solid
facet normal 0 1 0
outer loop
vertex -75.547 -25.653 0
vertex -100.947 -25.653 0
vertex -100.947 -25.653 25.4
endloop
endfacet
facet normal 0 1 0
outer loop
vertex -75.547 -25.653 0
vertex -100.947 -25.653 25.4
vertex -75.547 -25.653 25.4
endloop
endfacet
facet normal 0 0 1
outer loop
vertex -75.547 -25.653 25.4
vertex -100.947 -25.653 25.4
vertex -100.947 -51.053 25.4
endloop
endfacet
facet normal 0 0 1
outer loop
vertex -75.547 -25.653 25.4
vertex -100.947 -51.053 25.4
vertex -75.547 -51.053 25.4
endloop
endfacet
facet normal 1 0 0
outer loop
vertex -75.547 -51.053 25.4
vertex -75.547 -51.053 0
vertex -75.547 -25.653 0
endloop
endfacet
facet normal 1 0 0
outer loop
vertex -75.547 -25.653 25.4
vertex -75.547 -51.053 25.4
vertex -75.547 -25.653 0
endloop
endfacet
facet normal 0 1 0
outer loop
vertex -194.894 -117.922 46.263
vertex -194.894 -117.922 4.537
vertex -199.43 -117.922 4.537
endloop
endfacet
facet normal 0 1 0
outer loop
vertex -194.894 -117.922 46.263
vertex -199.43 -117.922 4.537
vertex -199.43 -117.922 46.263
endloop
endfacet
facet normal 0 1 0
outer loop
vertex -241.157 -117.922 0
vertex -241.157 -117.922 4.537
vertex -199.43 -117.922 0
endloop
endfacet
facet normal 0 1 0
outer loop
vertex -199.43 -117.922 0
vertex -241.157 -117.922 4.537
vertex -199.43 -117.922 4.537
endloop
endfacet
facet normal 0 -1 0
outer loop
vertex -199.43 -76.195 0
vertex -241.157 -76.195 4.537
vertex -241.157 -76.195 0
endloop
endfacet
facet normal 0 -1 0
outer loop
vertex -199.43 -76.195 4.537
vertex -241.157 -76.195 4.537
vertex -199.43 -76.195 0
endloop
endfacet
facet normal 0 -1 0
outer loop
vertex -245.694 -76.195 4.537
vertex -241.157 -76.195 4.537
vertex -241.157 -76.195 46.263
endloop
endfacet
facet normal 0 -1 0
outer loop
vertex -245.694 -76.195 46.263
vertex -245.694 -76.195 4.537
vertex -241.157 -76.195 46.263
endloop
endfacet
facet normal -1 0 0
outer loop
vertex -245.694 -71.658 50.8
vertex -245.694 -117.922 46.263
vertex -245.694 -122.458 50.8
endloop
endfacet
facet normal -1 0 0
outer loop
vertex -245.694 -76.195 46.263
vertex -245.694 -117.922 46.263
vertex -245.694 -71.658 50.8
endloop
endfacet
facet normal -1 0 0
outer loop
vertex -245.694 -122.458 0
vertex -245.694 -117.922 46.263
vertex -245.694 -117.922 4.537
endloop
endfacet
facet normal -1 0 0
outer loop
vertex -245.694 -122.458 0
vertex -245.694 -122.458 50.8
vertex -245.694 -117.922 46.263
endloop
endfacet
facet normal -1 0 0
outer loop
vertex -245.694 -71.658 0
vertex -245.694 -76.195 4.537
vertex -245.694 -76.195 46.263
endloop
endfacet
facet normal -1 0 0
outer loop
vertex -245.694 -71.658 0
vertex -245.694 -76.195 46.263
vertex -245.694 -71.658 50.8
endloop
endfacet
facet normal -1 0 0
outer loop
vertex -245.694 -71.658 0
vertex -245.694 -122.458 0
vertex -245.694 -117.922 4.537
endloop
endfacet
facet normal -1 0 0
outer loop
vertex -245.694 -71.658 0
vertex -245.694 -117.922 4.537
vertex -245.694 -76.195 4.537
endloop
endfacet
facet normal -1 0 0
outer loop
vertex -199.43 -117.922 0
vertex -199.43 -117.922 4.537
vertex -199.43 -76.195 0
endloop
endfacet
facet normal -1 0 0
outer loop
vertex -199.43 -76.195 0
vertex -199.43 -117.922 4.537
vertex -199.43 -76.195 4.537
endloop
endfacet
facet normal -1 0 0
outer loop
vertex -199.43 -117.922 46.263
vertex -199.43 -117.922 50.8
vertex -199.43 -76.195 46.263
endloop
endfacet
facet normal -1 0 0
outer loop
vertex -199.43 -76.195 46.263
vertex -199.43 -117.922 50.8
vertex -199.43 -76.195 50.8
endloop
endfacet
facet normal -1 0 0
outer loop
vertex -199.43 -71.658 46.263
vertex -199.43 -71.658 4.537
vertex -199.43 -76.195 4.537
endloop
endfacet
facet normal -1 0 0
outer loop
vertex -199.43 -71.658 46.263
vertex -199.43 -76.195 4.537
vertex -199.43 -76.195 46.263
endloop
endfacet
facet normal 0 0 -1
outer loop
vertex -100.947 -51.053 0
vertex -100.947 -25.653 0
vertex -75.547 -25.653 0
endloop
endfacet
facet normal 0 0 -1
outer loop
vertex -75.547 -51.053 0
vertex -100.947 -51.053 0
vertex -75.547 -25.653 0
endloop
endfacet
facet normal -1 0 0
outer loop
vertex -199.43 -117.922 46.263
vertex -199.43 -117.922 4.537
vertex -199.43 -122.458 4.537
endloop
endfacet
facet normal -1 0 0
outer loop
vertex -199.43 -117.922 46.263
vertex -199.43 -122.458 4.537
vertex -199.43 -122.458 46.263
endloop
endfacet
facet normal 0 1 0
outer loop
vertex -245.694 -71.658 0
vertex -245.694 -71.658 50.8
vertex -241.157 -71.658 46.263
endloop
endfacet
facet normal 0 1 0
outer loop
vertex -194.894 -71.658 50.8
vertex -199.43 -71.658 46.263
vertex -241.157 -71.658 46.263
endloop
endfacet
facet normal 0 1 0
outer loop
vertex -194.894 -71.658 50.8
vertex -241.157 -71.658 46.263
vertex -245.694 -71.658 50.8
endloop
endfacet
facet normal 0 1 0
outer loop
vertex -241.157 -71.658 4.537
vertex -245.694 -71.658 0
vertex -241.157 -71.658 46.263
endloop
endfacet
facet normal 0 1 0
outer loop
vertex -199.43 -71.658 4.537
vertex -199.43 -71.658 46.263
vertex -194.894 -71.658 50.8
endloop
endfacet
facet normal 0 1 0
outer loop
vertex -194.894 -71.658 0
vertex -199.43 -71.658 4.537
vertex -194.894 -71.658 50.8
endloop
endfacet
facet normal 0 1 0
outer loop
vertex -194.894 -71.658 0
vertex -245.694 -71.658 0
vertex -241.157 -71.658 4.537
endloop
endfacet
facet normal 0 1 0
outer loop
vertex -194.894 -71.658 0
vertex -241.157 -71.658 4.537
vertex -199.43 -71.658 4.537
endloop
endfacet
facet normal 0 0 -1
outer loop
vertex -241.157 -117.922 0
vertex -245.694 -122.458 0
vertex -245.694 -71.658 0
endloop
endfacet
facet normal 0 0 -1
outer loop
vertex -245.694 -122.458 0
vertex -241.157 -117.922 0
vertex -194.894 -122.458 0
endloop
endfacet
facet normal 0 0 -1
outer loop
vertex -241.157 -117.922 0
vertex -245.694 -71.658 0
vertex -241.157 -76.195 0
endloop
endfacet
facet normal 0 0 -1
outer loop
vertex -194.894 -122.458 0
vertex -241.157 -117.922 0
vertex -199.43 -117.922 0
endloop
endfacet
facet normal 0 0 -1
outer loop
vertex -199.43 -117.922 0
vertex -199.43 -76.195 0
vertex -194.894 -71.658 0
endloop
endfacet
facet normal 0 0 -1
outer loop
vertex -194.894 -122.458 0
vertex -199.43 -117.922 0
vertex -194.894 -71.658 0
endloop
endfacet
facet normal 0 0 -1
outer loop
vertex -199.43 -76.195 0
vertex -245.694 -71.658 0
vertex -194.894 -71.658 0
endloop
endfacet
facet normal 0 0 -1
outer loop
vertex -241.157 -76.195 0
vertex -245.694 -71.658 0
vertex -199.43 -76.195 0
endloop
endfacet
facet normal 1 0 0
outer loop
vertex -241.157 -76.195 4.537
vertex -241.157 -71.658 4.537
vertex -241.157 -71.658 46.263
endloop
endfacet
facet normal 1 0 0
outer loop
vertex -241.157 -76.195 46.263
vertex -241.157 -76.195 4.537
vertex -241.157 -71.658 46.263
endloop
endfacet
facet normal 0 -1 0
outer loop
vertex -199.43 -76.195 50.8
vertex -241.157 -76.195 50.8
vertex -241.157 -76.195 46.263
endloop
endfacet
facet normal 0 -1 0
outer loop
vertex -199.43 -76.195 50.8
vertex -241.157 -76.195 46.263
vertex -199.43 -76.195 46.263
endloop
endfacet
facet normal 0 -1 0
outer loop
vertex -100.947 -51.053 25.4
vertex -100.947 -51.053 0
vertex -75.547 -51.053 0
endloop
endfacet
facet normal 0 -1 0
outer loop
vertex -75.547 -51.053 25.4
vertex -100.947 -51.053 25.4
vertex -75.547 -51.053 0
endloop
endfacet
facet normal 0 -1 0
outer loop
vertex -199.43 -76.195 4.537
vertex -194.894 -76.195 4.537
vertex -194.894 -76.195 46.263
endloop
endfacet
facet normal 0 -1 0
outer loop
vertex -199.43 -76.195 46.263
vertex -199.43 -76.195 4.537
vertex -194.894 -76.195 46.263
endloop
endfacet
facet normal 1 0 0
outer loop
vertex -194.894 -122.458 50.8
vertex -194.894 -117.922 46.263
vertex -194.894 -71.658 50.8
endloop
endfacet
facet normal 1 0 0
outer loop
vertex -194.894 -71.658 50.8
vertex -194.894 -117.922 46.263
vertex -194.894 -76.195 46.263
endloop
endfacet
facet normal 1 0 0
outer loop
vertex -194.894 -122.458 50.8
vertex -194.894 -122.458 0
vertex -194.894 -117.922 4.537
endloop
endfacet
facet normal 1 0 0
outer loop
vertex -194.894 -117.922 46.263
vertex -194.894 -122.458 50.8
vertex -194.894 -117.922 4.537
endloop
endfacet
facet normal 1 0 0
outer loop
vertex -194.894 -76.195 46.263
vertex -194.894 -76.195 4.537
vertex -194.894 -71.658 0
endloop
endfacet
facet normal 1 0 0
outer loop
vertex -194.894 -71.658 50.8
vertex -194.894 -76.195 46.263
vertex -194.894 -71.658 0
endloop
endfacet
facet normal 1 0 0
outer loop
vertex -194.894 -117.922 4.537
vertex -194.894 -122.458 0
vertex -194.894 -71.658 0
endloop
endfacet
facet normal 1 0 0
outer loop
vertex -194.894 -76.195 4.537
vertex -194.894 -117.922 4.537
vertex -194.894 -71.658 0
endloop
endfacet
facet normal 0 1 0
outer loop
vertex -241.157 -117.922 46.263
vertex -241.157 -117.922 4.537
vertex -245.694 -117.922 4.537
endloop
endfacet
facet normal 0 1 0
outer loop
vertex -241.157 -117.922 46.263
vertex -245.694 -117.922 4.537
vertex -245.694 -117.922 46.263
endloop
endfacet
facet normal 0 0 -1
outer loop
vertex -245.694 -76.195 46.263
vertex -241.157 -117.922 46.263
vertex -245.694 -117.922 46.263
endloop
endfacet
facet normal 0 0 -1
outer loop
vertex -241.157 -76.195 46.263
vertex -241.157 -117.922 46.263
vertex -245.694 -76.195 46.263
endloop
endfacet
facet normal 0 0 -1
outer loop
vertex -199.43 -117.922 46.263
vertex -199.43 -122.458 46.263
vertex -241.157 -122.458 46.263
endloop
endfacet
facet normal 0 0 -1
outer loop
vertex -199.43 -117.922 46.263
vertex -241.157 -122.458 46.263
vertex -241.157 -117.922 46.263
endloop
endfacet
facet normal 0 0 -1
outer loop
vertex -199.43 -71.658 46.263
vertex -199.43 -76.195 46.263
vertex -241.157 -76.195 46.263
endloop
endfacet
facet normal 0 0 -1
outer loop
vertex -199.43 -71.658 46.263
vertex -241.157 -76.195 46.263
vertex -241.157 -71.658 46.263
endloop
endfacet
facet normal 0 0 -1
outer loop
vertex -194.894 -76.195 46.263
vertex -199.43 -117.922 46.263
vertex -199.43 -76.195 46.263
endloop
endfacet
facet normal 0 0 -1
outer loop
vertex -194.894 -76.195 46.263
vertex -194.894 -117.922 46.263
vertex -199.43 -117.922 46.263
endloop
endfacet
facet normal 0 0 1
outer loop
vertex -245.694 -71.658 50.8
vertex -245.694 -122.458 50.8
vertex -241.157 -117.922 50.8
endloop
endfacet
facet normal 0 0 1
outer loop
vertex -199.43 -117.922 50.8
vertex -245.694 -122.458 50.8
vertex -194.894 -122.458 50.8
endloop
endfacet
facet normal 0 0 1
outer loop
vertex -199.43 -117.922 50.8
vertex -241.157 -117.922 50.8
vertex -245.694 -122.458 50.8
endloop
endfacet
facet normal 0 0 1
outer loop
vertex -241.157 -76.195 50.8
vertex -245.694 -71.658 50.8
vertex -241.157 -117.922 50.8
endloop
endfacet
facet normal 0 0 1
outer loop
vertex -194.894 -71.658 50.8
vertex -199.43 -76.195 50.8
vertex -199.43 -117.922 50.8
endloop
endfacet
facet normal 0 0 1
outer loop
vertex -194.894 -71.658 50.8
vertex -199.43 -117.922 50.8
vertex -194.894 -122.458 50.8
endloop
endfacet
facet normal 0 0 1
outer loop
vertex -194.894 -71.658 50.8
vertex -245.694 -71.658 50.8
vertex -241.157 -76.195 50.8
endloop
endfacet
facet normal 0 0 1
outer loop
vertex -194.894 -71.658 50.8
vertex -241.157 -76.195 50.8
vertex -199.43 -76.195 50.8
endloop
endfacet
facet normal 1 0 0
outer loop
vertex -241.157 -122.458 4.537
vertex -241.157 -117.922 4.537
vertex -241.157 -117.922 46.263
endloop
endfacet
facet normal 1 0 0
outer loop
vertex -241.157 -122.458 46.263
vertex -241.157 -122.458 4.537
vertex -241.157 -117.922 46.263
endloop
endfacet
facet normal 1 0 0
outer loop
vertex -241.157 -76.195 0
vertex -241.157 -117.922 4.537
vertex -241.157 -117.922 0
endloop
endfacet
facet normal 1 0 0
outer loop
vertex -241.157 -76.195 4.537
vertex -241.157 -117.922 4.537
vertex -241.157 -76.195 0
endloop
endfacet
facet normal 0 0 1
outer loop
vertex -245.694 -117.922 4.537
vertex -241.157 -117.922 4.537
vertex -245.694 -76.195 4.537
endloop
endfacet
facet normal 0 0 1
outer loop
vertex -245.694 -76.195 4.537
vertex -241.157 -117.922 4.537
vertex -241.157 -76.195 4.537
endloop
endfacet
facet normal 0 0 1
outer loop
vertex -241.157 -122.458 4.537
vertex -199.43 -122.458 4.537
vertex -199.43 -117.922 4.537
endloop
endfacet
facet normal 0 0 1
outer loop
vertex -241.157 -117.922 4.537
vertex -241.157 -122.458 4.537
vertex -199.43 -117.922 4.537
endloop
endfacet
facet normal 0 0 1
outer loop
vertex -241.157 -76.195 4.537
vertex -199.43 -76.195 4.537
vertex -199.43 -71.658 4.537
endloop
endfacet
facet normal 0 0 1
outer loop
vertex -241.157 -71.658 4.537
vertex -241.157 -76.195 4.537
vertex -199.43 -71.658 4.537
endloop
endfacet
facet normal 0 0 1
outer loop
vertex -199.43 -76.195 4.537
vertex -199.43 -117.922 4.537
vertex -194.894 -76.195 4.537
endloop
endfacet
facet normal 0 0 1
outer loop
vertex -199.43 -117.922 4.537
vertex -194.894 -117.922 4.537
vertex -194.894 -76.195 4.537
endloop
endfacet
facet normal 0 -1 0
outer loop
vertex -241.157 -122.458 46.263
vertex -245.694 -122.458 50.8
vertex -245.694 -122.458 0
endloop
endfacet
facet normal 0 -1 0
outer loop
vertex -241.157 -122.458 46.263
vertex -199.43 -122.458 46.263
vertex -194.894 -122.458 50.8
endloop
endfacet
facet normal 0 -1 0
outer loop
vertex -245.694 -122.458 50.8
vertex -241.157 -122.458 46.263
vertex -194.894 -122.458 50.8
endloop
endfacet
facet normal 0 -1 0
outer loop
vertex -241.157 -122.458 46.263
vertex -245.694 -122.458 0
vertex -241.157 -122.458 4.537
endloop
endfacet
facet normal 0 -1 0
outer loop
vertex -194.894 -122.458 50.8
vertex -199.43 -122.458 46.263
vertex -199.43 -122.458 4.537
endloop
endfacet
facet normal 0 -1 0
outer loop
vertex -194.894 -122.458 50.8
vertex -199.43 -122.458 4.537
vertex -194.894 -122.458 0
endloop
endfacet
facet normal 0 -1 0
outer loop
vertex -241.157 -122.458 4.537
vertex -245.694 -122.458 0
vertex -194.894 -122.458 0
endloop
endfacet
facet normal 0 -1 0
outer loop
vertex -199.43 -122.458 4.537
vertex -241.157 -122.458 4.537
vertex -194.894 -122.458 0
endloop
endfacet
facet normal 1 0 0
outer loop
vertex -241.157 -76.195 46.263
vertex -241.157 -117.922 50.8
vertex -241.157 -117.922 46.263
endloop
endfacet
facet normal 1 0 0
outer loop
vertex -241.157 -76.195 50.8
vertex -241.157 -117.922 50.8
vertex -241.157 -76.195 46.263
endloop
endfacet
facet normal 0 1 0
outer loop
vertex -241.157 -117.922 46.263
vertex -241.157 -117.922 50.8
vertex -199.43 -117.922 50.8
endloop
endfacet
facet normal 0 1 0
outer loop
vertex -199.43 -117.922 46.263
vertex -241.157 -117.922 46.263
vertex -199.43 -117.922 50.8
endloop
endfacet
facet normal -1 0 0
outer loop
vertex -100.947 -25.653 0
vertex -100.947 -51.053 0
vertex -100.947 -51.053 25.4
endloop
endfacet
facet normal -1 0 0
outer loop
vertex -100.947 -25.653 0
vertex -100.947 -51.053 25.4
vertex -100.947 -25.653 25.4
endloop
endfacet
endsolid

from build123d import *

# Parameters (mm, degrees)
F0_W     = 25.4
F0_H     = 25.4
F1_DEPTH = 25.4
F2_W     = 50.8
F2_H     = 50.8
F3_DEPTH = 50.8
F4_W     = 41.726601
F4_H     = 41.726601
F5_DEPTH = 56.134
F6_W     = 41.726612
F6_H     = 41.726612
F7_DEPTH = 116.586
F8_W     = 41.726612
F8_H     = 41.726612
F9_DEPTH = 113.792


with BuildPart() as f1:
    # F0 (on Top) → F1 (new body)
    with BuildSketch(Plane.XY):
        with Locations((-88.246899, -38.353436)):
            Rectangle(F0_W, F0_H)
    extrude(amount=F1_DEPTH)


with BuildPart() as f3:
    # F2 (on Top) → F3 (new body)
    with BuildSketch(Plane.XY):
        with Locations((-220.293728, -97.05841)):
            Rectangle(F2_W, F2_H)
    extrude(amount=F3_DEPTH)

    # F4 (on face) → F5 (cut)
    with BuildSketch(Plane.XY.offset(50.8)):
        with Locations((-220.293728, -97.058409)):
            Rectangle(F4_W, F4_H)
    extrude(amount=-F5_DEPTH, mode=Mode.SUBTRACT)

    # F6 (on face) → F7 (cut)
    with BuildSketch(Plane(origin=(0, -71.65841, 0), x_dir=(-1, 0, 0), z_dir=(0, 1, 0))):
        with Locations((220.293728, 25.4)):
            Rectangle(F6_W, F6_H)
    extrude(amount=-F7_DEPTH, mode=Mode.SUBTRACT)

    # F8 (on face) → F9 (cut)
    with BuildSketch(Plane.YZ.offset(-194.893728)):
        with Locations((-97.05841, 25.4)):
            Rectangle(F8_W, F8_H)
    extrude(amount=-F9_DEPTH, mode=Mode.SUBTRACT)


solid = Compound([f1.part, f3.part])
